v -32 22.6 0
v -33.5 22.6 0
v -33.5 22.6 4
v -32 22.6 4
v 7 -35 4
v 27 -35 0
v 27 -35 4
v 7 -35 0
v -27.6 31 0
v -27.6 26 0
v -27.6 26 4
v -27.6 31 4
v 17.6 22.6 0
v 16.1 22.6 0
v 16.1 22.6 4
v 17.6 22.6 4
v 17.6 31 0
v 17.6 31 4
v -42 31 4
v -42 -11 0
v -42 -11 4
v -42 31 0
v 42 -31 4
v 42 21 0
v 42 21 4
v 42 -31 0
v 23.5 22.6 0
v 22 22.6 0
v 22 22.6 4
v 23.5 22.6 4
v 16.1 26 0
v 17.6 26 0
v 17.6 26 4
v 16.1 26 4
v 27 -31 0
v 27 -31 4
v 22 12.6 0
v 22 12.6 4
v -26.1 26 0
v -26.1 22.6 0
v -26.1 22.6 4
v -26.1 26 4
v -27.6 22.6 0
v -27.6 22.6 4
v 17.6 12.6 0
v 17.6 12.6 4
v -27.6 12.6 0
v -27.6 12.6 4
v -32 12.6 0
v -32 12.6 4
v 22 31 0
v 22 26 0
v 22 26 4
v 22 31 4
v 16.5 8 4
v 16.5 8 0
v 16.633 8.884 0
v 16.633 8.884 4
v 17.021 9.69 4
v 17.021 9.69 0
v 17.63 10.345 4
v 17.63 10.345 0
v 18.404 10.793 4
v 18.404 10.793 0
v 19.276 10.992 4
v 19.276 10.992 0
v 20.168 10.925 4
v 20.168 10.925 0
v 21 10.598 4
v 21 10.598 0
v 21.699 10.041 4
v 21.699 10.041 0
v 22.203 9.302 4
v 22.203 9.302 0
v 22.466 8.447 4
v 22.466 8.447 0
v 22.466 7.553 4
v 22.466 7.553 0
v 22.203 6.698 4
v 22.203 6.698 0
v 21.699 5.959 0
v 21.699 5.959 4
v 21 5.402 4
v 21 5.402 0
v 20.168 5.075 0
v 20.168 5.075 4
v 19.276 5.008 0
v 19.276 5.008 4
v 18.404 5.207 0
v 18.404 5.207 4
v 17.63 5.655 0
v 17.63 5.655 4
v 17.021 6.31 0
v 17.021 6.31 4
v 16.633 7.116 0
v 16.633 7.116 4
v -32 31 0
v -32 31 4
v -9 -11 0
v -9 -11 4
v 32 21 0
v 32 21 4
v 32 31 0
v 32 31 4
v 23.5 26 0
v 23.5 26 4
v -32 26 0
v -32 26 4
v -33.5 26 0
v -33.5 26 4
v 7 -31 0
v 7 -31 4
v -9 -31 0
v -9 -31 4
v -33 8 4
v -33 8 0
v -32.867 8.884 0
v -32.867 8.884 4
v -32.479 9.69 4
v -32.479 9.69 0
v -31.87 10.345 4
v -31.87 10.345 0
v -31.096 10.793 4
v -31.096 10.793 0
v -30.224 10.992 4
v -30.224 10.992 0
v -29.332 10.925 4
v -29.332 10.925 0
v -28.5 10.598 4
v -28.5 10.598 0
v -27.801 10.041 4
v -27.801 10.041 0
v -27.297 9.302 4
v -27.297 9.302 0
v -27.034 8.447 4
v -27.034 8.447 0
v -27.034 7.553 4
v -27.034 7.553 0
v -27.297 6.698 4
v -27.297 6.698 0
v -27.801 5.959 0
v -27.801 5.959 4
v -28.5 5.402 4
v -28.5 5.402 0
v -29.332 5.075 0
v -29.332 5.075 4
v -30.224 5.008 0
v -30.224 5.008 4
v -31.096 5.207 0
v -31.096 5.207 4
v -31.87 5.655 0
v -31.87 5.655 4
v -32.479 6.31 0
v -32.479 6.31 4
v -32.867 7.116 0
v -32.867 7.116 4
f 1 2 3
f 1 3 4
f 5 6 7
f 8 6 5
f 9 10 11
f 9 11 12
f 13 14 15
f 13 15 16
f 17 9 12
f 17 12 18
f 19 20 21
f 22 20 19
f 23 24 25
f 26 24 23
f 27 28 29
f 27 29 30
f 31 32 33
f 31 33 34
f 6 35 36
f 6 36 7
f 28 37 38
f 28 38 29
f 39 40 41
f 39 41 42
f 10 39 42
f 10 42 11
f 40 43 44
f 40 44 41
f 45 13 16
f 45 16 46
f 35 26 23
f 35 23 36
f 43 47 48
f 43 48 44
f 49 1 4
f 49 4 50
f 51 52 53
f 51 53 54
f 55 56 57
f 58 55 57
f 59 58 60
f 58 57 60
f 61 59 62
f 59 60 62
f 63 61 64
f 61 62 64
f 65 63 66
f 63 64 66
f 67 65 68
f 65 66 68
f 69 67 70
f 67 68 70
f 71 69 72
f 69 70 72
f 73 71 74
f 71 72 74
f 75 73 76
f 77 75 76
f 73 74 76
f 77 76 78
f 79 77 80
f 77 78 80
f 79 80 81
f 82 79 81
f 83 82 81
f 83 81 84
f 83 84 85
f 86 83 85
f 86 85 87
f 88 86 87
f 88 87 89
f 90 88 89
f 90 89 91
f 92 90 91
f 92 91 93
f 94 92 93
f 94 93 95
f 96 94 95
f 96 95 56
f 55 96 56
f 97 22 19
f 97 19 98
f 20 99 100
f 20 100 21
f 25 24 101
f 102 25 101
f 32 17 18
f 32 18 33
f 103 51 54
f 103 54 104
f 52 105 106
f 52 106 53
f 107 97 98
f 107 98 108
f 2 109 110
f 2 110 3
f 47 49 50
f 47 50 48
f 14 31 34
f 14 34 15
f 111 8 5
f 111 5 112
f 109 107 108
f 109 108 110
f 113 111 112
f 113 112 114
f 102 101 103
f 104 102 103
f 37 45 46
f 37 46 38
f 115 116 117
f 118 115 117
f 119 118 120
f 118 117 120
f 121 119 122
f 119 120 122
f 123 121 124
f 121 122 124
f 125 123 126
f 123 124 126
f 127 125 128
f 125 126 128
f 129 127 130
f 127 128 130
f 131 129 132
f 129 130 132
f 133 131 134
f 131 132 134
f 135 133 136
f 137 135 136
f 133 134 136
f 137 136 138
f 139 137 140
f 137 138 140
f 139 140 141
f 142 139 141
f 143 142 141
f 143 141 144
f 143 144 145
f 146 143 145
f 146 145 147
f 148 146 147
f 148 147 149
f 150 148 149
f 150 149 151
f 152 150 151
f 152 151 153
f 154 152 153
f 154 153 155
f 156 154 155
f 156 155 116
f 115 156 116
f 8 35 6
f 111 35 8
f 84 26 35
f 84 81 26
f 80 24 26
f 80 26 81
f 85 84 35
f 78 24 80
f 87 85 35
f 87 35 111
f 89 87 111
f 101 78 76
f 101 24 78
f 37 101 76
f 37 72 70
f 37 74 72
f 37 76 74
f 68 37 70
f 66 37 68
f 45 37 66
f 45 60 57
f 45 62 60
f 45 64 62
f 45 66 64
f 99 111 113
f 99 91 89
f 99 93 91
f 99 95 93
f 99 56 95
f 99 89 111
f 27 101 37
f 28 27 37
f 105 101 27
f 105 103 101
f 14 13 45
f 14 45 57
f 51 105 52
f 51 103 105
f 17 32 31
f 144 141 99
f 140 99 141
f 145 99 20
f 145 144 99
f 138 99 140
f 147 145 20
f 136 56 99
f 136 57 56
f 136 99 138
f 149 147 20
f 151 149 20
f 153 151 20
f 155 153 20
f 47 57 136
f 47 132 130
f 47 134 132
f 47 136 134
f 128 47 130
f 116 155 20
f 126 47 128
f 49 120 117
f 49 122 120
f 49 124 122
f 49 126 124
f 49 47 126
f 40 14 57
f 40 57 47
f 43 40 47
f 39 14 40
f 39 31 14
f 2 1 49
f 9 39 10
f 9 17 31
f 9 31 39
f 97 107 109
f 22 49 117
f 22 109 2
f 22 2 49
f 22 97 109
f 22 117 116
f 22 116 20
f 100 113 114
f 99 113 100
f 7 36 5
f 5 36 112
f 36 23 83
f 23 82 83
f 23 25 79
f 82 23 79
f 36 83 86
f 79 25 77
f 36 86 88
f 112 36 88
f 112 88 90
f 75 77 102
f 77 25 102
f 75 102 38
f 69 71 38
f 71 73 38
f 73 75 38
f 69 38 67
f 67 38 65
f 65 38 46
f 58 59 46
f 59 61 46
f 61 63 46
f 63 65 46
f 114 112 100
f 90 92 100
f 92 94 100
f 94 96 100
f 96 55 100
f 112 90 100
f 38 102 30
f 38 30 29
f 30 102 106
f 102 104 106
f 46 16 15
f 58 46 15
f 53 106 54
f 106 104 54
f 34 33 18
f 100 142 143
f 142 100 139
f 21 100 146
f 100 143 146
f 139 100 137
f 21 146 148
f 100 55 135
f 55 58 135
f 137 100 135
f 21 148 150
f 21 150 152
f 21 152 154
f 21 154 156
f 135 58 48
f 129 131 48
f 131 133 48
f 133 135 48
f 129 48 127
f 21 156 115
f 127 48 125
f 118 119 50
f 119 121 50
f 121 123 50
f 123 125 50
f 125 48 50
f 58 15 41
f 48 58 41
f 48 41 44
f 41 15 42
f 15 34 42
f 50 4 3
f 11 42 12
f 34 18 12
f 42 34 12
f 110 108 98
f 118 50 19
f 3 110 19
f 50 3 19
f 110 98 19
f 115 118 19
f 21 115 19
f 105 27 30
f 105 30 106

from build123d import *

# Parameters (mm, degrees)
BOSS_EXTRUDE1_DEPTH = 4
SKETCH2_W           = 33
SKETCH2_H           = 20
SKETCH2_W_2         = 10
SKETCH2_H_2         = 10
CUT_EXTRUDE1_DEPTH  = 5
CUT_EXTRUDE2_DEPTH  = 10
SKETCH4_R           = 3
CUT_EXTRUDE3_DEPTH  = 10


with BuildPart() as part:
    # Sketch1 → Boss-Extrude1 (new body)
    with BuildSketch(Plane.XY):
        Polygon((27, -31), (27, -35), (7, -35), (7, -31), (-42, -31), (-42, 31), (42, 31), (42, -31), align=None)
    extrude(amount=BOSS_EXTRUDE1_DEPTH)

    # Sketch2 → Cut-Extrude1 (cut)
    with BuildSketch(Plane(origin=(0, 0, 0), x_dir=(-1, 0, 0), z_dir=(0, 0, -1))):
        with Locations((25.5, -21)):
            Rectangle(SKETCH2_W, SKETCH2_H)
        with Locations((-37, 26)):
            Rectangle(SKETCH2_W_2, SKETCH2_H_2)
    extrude(amount=-CUT_EXTRUDE1_DEPTH, mode=Mode.SUBTRACT)

    # Sketch3 → Cut-Extrude2 (cut)
    with BuildSketch(Plane(origin=(0, 0, 0), x_dir=(-1, 0, 0), z_dir=(0, 0, -1))):
        Polygon((32, 22.6), (32, 12.6), (27.6, 12.6), (27.6, 22.6), (26.1, 22.6), (26.1, 26), (27.6, 26), (27.6, 31), (32, 31), (32, 26), (33.5, 26), (33.5, 22.6), align=None)
        Polygon((-17.6, 22.6), (-17.6, 12.6), (-22, 12.6), (-22, 22.6), (-23.5, 22.6), (-23.5, 26), (-22, 26), (-22, 31), (-17.6, 31), (-17.6, 26), (-16.1, 26), (-16.1, 22.6), align=None)
    extrude(amount=-CUT_EXTRUDE2_DEPTH, mode=Mode.SUBTRACT)

    # Sketch4 → Cut-Extrude3 (cut)
    with BuildSketch(Plane(origin=(0, 0, 0), x_dir=(-1, 0, 0), z_dir=(0, 0, -1))):
        with Locations((30, 8)):
            Circle(SKETCH4_R)
        with Locations((-19.5, 8)):
            Circle(SKETCH4_R)
    extrude(amount=-CUT_EXTRUDE3_DEPTH, mode=Mode.SUBTRACT)


solid = part.part
